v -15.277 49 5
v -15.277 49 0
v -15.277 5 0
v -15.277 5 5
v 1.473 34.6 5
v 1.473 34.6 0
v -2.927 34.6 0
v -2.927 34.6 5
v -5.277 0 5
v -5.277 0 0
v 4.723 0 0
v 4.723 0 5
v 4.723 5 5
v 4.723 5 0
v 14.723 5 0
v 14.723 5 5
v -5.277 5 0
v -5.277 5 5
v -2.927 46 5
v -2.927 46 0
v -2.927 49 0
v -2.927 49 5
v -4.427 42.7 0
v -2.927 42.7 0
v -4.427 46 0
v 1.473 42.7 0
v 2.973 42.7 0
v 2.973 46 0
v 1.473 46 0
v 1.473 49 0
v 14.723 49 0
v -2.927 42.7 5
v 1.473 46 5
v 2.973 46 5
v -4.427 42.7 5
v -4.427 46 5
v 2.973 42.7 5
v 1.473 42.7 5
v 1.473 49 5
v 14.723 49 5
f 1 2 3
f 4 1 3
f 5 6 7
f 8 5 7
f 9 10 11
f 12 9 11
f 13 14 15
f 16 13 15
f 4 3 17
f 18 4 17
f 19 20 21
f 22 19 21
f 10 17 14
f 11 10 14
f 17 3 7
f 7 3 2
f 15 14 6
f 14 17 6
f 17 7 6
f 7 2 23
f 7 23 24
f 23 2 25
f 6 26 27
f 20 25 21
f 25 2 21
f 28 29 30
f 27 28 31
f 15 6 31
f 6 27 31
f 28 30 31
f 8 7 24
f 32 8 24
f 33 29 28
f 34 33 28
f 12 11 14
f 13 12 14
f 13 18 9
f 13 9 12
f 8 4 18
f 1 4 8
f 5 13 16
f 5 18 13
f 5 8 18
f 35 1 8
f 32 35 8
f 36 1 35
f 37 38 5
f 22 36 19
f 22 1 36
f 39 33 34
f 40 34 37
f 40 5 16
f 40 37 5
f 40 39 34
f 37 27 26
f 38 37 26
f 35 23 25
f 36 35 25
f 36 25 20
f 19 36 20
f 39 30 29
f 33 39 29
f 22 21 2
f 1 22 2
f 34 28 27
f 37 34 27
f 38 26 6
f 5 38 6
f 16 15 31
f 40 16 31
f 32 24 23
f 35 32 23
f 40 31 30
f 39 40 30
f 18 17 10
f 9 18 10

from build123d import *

# Parameters (mm, degrees)
BOSS_EXTRUDE1_DEPTH = 5
CUT_EXTRUDE1_DEPTH  = 5


with BuildPart() as part:
    # Sketch1 → Boss-Extrude1 (new body)
    with BuildSketch(Plane.XY):
        Polygon((-5.27676951, 0), (4.72323049, 0), (4.72323049, 5), (14.72323049, 5), (14.72323049, 49), (-15.27676951, 49), (-15.27676951, 5), (-5.27676951, 5), align=None)
    extrude(amount=BOSS_EXTRUDE1_DEPTH)

    # Sketch2 → Cut-Extrude1 (cut)
    with BuildSketch(Plane(origin=(0, 0, 0), x_dir=(-1, 0, 0), z_dir=(0, 0, -1))):
        Polygon((-1.472855596, 34.6), (2.927144404, 34.6), (2.927144404, 42.7), (4.427144404, 42.7), (4.427144404, 46), (2.927144404, 46), (2.927144404, 49), (-1.472855596, 49), (-1.472855596, 46), (-2.972855596, 46), (-2.972855596, 42.7), (-1.472855596, 42.7), align=None)
    extrude(amount=-CUT_EXTRUDE1_DEPTH, mode=Mode.SUBTRACT)


solid = part.part
